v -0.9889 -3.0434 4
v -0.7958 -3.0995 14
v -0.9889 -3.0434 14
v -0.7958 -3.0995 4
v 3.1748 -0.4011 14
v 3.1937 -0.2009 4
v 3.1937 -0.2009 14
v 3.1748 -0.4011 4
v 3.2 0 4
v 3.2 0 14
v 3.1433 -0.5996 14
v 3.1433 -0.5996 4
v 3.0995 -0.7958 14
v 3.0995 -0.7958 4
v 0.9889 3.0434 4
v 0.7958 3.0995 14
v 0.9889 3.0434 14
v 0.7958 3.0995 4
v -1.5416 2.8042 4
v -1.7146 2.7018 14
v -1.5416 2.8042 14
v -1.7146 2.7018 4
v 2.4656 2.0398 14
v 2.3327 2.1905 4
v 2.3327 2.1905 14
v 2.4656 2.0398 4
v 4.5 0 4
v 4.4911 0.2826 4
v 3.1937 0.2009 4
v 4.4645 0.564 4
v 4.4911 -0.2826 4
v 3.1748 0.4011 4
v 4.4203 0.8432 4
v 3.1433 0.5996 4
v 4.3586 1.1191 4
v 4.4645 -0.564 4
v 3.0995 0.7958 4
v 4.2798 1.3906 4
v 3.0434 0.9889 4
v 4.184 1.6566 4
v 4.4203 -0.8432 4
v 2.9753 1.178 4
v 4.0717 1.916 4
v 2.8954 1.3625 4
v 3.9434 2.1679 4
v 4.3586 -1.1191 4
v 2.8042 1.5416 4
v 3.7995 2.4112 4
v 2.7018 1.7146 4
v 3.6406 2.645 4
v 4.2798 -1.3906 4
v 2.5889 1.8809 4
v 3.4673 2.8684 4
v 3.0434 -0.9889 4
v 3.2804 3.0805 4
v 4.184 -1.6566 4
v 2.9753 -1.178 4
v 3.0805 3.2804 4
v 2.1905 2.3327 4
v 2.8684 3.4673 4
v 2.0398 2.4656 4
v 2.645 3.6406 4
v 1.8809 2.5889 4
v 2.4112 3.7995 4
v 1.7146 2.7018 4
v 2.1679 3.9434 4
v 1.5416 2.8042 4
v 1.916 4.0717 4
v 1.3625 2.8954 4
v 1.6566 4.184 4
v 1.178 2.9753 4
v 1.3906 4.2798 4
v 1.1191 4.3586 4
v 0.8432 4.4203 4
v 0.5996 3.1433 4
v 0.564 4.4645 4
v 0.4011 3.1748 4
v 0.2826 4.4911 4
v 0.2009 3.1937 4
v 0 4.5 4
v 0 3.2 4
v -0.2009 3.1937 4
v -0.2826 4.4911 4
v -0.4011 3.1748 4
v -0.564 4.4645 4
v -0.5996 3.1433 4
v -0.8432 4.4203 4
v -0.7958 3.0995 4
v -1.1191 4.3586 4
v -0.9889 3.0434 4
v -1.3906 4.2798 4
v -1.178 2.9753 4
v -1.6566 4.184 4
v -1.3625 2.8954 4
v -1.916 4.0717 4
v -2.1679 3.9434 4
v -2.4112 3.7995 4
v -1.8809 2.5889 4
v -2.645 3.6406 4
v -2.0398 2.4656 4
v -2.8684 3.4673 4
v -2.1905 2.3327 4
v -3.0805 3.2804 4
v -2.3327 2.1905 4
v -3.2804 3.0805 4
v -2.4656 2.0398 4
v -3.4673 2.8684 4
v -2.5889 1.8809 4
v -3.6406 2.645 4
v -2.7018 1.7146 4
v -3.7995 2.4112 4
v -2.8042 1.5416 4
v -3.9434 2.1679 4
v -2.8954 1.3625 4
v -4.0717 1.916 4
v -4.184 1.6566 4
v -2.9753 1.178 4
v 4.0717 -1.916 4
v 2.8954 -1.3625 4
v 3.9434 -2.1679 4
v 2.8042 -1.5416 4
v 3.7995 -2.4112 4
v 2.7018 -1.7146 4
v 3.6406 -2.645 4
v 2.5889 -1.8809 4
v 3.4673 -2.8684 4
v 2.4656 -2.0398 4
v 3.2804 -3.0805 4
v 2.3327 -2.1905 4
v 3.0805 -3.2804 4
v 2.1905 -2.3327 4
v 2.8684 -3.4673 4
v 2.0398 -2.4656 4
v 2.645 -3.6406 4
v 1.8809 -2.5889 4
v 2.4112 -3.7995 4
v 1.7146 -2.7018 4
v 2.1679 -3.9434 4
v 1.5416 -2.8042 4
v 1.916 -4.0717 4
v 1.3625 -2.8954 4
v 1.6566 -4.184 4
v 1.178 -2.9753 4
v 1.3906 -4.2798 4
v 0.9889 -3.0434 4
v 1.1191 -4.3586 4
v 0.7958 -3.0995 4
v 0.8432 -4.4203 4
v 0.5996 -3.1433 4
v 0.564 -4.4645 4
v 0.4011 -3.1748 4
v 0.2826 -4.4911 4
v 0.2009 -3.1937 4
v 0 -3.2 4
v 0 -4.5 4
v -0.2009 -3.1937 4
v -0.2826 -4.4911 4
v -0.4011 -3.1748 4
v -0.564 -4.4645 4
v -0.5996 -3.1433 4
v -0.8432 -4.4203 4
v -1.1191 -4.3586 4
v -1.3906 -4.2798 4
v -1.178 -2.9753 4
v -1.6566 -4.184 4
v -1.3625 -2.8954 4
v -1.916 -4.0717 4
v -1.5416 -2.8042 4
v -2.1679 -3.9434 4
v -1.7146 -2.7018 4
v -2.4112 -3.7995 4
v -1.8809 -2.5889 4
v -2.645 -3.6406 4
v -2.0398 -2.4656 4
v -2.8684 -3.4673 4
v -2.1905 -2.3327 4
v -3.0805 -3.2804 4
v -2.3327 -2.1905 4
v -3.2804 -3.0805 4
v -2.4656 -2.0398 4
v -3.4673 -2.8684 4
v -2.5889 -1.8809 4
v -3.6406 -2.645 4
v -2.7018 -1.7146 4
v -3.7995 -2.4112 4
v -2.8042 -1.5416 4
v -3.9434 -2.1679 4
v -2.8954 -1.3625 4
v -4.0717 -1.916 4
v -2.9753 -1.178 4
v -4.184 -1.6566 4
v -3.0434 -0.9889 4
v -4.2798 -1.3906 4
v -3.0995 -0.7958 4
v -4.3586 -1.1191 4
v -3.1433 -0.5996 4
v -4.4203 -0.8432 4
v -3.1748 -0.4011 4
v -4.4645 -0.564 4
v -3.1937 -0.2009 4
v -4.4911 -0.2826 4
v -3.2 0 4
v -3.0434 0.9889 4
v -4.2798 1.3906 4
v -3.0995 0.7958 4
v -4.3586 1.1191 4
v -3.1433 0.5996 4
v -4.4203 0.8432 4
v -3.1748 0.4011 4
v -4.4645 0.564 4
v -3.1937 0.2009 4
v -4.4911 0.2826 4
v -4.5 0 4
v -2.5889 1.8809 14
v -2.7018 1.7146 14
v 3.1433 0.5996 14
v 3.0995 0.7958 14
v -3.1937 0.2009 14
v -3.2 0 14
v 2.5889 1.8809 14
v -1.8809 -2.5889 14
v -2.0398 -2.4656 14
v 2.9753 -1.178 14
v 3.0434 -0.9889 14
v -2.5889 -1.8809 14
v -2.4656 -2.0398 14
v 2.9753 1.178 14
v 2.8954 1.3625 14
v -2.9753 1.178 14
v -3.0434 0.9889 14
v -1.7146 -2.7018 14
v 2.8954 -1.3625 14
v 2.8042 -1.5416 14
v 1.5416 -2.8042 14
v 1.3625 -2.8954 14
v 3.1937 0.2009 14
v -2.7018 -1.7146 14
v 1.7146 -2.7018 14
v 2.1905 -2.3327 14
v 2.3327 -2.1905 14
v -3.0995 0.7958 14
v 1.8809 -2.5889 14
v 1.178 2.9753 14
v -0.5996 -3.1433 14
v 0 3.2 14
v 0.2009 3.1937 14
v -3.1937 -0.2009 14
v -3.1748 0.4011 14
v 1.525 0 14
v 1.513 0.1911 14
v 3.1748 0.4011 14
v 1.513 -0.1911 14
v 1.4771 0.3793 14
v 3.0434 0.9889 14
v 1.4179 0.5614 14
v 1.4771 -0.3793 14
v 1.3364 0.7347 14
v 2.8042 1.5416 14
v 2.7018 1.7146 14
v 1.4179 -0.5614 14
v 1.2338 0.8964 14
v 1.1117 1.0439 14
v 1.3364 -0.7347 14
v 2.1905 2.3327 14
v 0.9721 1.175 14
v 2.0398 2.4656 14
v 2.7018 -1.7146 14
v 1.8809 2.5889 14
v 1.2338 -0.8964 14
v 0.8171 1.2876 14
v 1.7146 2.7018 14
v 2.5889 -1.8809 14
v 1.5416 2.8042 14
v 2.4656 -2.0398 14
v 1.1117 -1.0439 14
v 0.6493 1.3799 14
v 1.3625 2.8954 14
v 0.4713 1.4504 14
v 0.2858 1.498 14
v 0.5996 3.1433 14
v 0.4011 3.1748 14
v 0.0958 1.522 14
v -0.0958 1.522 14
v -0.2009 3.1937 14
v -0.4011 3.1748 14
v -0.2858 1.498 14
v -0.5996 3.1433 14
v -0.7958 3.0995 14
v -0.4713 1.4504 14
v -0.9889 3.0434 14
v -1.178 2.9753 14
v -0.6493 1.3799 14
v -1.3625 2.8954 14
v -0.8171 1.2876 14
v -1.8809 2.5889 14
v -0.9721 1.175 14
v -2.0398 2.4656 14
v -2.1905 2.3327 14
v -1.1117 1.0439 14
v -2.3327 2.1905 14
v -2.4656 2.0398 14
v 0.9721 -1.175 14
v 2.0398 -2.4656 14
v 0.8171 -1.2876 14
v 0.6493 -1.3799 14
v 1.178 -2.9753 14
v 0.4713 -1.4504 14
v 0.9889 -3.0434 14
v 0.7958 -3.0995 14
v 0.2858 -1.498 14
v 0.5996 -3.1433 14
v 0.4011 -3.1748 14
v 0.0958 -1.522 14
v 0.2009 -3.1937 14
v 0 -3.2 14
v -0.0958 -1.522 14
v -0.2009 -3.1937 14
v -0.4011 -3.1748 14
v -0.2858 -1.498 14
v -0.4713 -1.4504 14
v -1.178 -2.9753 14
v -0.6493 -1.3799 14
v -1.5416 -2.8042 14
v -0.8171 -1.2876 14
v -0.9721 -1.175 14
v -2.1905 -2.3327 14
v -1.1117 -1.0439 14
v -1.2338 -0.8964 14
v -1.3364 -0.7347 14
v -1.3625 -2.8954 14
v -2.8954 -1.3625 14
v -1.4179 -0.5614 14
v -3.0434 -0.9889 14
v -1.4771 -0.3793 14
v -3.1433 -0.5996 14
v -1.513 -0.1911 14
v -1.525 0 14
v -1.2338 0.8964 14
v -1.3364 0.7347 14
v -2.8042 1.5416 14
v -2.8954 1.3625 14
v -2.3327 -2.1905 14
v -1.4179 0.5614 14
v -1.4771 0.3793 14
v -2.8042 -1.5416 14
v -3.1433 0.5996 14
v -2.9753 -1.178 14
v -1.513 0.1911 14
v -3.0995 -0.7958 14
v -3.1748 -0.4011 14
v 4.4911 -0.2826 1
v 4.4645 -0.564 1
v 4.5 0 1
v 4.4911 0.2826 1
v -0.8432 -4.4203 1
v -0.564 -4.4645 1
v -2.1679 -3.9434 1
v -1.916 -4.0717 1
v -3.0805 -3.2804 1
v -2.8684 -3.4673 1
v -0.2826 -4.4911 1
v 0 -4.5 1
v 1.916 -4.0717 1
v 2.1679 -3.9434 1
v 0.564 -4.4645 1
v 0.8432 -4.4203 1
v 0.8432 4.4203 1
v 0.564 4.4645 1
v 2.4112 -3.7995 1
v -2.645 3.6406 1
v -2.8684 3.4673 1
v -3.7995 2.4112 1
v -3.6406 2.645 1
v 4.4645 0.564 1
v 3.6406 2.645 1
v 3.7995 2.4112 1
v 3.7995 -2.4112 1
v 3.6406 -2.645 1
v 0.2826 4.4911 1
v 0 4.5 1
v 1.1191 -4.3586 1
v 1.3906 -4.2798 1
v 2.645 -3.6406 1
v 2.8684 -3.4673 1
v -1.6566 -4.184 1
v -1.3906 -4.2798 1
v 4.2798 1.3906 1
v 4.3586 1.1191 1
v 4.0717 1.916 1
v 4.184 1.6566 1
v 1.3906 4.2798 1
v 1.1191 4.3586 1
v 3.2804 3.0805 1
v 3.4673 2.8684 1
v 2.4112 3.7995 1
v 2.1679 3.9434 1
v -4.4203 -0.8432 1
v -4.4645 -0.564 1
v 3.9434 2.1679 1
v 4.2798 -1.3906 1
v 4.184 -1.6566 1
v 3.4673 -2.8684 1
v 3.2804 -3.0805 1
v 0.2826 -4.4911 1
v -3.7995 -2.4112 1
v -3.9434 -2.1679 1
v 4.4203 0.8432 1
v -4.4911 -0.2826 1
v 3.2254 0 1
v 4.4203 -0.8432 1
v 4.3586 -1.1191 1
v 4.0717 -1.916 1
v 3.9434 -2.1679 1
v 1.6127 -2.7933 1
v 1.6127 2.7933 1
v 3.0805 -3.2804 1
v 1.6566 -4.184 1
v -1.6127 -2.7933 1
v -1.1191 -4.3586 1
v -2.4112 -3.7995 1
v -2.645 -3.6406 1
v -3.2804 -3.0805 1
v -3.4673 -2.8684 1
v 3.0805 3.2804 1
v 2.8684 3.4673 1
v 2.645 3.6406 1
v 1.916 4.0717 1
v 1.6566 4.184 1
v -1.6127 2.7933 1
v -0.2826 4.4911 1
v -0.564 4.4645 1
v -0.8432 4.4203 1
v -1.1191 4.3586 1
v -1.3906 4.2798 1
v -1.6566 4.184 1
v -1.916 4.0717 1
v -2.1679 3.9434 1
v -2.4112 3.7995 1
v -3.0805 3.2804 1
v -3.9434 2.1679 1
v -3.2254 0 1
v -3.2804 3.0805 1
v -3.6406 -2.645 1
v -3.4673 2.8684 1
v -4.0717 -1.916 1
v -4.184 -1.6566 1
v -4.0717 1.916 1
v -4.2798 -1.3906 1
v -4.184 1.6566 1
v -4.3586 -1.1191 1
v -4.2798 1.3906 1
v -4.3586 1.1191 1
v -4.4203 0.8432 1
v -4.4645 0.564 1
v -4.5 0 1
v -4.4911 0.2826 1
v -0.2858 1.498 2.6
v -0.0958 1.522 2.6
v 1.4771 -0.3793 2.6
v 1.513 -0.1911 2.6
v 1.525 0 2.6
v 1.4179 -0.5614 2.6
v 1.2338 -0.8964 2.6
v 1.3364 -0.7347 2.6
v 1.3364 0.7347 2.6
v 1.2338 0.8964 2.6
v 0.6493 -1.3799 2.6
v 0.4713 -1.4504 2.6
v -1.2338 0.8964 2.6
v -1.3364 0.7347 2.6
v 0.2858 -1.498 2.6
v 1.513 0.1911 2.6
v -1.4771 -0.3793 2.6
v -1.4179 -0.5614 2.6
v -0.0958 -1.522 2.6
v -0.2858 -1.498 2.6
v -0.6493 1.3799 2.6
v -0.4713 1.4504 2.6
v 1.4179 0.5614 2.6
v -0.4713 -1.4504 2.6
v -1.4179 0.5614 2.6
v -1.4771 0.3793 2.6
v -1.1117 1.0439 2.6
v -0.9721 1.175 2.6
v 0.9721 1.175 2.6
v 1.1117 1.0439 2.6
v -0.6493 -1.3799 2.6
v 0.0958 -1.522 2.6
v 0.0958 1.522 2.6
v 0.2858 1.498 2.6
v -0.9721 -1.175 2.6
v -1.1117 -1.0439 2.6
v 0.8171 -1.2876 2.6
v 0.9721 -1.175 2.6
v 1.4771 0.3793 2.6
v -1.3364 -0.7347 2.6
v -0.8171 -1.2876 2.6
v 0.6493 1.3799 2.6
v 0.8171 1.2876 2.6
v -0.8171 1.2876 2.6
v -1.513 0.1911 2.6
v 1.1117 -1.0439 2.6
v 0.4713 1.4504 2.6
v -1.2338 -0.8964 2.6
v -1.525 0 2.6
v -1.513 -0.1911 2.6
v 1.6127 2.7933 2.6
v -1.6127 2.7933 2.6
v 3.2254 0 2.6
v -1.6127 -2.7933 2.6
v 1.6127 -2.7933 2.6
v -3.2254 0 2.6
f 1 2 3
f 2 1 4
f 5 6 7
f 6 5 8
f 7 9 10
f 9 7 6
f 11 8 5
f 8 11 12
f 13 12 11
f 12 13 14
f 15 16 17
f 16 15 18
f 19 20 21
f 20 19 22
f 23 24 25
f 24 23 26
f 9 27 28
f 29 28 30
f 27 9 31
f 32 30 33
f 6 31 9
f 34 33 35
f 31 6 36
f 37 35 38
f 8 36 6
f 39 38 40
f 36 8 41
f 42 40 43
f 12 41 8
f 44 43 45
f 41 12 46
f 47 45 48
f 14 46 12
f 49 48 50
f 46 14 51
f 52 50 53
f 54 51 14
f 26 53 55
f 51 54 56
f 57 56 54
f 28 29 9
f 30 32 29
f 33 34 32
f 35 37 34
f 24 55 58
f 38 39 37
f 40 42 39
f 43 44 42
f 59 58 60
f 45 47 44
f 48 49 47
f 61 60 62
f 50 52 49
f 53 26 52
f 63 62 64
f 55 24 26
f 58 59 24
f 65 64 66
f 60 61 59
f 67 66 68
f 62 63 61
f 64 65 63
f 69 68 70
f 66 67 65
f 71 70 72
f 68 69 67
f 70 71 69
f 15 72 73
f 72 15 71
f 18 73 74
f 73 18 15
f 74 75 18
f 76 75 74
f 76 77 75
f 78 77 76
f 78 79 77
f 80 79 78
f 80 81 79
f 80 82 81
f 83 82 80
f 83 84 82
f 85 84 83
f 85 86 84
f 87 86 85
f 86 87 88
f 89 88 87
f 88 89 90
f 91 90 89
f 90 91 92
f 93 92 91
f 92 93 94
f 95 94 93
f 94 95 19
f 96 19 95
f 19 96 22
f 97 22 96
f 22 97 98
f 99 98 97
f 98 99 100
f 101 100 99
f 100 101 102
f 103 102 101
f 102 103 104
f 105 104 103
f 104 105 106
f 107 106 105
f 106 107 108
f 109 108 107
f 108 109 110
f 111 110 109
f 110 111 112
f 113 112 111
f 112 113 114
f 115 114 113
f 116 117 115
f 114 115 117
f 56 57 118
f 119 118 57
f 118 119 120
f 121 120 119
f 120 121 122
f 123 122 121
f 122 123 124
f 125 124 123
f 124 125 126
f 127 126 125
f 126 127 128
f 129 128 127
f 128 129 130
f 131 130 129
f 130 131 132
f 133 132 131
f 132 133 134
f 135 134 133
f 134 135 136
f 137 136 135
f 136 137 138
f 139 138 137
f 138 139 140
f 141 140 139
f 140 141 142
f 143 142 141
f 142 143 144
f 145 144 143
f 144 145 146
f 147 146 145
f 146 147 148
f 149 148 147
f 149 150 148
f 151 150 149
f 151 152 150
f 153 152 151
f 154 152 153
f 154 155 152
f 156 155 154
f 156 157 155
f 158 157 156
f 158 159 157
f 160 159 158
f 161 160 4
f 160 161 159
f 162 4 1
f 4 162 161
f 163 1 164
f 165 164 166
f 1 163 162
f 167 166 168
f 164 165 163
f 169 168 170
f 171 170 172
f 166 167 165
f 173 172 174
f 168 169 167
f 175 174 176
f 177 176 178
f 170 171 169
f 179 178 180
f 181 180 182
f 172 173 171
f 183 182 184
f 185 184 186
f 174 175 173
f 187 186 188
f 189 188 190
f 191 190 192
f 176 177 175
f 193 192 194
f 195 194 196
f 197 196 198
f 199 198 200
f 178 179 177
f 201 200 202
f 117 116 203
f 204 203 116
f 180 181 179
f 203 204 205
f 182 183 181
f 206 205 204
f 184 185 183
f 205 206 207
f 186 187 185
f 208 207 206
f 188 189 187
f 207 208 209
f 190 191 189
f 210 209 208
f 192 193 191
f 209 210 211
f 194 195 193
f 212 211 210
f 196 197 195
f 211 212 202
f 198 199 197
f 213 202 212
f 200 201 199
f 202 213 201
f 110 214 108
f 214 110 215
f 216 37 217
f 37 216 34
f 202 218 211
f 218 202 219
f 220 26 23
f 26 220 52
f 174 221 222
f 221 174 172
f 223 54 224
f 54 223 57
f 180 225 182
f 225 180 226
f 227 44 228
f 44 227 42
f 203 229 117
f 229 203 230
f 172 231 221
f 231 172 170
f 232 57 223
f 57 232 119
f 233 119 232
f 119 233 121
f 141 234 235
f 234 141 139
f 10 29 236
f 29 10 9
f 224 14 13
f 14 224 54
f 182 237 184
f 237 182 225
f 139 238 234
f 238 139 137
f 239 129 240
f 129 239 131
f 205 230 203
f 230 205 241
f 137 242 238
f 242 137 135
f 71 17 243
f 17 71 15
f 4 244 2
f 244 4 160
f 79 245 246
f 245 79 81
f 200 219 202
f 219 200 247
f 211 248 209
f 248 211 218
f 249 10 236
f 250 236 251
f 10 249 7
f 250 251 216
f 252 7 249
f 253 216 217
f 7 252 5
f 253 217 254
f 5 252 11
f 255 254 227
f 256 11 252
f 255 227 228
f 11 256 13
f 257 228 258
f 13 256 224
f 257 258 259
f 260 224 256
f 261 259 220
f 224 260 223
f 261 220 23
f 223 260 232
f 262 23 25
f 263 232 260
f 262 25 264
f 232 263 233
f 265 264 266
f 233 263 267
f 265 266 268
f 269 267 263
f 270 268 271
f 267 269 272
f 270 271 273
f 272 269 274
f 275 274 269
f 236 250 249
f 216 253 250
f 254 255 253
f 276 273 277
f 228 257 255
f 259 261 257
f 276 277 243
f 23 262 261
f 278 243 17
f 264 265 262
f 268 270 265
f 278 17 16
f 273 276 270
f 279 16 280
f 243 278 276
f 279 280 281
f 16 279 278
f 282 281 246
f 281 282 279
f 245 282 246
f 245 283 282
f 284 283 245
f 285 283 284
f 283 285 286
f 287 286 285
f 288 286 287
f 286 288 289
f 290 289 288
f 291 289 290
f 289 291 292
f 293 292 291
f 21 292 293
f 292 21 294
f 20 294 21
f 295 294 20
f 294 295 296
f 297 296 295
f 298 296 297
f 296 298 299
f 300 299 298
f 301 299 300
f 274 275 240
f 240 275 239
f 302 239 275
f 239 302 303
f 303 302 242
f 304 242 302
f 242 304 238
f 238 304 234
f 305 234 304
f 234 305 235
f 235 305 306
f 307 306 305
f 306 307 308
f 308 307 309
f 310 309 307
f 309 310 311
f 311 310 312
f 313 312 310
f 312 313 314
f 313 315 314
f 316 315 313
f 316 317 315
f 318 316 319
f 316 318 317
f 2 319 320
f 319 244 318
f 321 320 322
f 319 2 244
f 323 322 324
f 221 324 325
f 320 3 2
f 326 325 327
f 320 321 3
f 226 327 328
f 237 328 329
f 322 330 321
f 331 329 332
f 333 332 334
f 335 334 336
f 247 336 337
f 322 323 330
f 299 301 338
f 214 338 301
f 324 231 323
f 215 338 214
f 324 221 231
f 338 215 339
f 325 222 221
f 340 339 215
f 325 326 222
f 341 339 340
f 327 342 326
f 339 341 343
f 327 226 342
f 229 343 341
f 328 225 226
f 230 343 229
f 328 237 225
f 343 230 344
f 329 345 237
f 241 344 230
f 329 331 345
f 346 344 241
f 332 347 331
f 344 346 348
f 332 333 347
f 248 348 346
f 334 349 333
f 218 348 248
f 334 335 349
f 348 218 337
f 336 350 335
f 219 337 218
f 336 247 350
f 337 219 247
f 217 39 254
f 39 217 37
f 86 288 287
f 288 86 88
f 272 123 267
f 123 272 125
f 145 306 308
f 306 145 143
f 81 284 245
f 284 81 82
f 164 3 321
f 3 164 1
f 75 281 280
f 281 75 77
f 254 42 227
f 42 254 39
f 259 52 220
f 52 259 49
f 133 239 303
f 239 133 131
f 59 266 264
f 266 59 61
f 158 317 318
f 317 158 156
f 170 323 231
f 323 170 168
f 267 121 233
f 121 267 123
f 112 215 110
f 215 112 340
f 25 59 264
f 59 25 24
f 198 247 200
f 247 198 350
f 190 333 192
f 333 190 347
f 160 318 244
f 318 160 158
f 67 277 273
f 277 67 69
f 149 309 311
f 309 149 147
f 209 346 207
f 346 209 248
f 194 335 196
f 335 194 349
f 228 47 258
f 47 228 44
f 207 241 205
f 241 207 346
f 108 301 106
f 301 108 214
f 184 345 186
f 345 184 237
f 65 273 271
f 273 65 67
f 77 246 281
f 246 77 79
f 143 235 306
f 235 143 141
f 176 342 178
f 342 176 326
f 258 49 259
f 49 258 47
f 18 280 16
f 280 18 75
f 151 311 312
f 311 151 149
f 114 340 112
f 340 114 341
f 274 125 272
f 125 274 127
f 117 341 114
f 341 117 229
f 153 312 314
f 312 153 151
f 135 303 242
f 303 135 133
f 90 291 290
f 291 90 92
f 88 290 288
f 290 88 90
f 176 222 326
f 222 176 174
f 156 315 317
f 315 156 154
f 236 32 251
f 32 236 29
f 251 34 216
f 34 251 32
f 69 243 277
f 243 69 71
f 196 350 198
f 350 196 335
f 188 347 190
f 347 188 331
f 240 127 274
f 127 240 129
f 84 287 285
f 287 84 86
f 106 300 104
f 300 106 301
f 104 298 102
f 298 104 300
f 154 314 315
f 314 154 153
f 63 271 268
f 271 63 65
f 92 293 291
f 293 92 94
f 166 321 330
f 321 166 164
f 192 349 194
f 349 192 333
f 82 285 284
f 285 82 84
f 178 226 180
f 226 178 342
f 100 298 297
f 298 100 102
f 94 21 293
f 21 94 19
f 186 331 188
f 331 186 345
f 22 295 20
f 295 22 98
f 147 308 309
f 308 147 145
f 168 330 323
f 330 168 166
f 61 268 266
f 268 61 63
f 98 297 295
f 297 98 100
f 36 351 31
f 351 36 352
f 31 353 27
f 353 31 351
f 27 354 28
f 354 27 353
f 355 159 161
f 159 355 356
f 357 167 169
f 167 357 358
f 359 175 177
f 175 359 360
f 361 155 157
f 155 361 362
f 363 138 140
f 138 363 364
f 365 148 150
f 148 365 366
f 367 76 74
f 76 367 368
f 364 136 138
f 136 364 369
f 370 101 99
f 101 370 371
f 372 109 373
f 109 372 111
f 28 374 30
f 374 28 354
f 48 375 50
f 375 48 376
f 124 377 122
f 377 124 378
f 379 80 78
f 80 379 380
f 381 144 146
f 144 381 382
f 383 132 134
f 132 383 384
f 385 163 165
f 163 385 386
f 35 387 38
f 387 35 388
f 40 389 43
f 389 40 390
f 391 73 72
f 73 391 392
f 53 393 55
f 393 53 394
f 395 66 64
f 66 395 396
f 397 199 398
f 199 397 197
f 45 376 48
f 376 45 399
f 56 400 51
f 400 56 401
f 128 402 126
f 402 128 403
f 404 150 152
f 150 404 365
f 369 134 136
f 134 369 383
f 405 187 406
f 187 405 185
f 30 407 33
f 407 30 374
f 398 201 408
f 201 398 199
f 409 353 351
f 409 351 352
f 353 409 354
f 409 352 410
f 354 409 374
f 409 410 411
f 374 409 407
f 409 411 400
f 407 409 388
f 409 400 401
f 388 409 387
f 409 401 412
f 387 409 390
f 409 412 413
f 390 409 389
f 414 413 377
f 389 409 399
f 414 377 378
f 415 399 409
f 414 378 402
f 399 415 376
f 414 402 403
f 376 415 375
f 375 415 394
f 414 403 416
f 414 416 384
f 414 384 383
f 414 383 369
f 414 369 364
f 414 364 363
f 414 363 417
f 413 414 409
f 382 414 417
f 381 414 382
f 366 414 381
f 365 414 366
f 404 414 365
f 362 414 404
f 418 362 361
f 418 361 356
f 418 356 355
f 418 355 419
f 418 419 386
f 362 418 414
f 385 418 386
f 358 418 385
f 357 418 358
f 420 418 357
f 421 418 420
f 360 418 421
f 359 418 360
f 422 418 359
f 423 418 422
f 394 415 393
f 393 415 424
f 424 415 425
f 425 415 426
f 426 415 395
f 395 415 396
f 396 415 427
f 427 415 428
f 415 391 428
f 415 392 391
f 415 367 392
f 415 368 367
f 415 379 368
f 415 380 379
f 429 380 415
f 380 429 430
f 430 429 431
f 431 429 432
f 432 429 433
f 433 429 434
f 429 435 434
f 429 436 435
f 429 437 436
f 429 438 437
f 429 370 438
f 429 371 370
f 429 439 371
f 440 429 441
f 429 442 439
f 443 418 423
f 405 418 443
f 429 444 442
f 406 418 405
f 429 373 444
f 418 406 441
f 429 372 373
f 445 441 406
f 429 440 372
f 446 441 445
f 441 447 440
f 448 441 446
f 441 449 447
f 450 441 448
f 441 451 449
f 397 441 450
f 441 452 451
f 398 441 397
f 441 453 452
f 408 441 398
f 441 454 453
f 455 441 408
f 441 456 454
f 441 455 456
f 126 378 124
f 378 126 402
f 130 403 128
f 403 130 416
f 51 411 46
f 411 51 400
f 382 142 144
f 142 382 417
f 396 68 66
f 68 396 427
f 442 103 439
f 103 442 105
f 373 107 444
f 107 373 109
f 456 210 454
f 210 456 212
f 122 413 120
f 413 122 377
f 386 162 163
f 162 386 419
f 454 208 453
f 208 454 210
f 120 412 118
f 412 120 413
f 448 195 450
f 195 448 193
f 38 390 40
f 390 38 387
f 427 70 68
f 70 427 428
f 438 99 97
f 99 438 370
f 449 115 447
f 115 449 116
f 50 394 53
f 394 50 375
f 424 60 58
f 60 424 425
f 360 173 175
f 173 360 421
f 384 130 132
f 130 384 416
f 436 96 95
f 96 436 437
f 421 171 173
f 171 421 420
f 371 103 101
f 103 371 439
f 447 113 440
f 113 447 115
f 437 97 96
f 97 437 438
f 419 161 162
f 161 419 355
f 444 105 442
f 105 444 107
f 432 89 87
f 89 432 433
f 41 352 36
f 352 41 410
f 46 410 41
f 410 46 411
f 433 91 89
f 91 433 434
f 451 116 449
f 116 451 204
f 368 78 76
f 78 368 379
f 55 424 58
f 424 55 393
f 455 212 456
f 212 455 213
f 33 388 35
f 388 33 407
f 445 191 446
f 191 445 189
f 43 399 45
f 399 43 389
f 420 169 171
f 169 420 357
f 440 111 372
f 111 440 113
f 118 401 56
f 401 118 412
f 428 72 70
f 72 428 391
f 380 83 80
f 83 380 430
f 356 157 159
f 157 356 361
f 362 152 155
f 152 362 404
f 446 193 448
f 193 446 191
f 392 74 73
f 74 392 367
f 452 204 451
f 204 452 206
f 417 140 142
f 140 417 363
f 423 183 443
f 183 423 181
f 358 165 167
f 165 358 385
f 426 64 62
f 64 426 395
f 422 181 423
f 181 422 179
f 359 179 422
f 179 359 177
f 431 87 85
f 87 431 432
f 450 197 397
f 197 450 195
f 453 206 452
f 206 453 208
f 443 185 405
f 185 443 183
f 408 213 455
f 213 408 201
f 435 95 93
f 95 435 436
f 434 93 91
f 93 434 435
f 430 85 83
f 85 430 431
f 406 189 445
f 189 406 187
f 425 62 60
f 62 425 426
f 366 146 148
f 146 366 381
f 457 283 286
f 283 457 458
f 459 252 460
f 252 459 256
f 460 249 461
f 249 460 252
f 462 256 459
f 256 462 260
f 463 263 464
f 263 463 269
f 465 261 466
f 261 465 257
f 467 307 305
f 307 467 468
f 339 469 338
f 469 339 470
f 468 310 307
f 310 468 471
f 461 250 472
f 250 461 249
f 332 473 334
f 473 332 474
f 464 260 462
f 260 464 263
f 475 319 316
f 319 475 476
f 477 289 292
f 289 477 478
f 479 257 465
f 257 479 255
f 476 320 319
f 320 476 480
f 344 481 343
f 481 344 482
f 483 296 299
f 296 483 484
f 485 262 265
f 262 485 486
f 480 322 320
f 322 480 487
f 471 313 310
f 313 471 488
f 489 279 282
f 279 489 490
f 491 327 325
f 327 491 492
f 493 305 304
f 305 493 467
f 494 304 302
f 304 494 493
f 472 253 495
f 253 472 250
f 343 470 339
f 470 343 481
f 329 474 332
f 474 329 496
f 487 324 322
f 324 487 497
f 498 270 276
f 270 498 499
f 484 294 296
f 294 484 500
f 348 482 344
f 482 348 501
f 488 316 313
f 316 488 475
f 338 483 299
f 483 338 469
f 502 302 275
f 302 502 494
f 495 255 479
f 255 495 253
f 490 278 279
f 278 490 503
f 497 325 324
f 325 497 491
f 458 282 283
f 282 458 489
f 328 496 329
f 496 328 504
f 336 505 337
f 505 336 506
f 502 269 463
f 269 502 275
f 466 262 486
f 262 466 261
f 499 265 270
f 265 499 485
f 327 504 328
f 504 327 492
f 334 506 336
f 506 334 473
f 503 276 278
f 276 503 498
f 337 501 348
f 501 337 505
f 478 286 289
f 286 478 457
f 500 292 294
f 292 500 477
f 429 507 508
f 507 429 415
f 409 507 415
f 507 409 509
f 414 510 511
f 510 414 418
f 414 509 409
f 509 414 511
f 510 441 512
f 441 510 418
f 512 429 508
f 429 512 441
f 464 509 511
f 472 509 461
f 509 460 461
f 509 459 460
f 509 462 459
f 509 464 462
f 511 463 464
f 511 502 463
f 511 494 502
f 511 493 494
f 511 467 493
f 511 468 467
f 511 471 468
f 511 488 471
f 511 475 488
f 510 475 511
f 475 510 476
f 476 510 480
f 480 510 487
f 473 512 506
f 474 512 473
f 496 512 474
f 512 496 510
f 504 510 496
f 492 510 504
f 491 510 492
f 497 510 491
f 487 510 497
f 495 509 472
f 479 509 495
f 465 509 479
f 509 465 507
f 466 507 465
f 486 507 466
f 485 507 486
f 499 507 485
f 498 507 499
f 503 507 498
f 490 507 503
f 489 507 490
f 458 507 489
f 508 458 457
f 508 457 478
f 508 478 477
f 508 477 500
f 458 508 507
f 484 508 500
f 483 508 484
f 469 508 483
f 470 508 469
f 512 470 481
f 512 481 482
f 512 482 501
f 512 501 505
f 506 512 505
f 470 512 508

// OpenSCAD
/*
This documentation describes Open Hardware and is licensed under the CERN OHL v. 1.2.

You may redistribute and modify this documentation under the terms of the
CERN OHL v.1.2. (http://ohwr.org/cernohl). This documentation is distributed
WITHOUT   ANY   EXPRESS   OR   IMPLIED   WARRANTY,   INCLUDING   OF
MERCHANTABILITY,   SATISFACTORY   QUALITY   AND   FITNESS   FOR   A
PARTICULAR   PURPOSE.   Please   see   the   CERN   OHL   v.1.2  for   applicable
conditions.
*/

// This is an adapter that allows you to use a m3 screw in a larger hole with a nut.
translate([0,0,14])
rotate([180,0,0])
difference() {
    
    union() {
        cylinder(d=6.40,h=10, $fn=100 );
        translate([0,0,10])
        cylinder(d=9,h=3, $fn=100 );
    }
    cylinder(d=3.05,h=14, $fn=50 );
    translate([0,0,14-2.6])
    nut_trap();
}

module nut_trap (w = 5.5, h = 2.6){
    cylinder(r = w / 2 / cos(180 / 6) + 0.05, h=h, $fn=6);
}   
